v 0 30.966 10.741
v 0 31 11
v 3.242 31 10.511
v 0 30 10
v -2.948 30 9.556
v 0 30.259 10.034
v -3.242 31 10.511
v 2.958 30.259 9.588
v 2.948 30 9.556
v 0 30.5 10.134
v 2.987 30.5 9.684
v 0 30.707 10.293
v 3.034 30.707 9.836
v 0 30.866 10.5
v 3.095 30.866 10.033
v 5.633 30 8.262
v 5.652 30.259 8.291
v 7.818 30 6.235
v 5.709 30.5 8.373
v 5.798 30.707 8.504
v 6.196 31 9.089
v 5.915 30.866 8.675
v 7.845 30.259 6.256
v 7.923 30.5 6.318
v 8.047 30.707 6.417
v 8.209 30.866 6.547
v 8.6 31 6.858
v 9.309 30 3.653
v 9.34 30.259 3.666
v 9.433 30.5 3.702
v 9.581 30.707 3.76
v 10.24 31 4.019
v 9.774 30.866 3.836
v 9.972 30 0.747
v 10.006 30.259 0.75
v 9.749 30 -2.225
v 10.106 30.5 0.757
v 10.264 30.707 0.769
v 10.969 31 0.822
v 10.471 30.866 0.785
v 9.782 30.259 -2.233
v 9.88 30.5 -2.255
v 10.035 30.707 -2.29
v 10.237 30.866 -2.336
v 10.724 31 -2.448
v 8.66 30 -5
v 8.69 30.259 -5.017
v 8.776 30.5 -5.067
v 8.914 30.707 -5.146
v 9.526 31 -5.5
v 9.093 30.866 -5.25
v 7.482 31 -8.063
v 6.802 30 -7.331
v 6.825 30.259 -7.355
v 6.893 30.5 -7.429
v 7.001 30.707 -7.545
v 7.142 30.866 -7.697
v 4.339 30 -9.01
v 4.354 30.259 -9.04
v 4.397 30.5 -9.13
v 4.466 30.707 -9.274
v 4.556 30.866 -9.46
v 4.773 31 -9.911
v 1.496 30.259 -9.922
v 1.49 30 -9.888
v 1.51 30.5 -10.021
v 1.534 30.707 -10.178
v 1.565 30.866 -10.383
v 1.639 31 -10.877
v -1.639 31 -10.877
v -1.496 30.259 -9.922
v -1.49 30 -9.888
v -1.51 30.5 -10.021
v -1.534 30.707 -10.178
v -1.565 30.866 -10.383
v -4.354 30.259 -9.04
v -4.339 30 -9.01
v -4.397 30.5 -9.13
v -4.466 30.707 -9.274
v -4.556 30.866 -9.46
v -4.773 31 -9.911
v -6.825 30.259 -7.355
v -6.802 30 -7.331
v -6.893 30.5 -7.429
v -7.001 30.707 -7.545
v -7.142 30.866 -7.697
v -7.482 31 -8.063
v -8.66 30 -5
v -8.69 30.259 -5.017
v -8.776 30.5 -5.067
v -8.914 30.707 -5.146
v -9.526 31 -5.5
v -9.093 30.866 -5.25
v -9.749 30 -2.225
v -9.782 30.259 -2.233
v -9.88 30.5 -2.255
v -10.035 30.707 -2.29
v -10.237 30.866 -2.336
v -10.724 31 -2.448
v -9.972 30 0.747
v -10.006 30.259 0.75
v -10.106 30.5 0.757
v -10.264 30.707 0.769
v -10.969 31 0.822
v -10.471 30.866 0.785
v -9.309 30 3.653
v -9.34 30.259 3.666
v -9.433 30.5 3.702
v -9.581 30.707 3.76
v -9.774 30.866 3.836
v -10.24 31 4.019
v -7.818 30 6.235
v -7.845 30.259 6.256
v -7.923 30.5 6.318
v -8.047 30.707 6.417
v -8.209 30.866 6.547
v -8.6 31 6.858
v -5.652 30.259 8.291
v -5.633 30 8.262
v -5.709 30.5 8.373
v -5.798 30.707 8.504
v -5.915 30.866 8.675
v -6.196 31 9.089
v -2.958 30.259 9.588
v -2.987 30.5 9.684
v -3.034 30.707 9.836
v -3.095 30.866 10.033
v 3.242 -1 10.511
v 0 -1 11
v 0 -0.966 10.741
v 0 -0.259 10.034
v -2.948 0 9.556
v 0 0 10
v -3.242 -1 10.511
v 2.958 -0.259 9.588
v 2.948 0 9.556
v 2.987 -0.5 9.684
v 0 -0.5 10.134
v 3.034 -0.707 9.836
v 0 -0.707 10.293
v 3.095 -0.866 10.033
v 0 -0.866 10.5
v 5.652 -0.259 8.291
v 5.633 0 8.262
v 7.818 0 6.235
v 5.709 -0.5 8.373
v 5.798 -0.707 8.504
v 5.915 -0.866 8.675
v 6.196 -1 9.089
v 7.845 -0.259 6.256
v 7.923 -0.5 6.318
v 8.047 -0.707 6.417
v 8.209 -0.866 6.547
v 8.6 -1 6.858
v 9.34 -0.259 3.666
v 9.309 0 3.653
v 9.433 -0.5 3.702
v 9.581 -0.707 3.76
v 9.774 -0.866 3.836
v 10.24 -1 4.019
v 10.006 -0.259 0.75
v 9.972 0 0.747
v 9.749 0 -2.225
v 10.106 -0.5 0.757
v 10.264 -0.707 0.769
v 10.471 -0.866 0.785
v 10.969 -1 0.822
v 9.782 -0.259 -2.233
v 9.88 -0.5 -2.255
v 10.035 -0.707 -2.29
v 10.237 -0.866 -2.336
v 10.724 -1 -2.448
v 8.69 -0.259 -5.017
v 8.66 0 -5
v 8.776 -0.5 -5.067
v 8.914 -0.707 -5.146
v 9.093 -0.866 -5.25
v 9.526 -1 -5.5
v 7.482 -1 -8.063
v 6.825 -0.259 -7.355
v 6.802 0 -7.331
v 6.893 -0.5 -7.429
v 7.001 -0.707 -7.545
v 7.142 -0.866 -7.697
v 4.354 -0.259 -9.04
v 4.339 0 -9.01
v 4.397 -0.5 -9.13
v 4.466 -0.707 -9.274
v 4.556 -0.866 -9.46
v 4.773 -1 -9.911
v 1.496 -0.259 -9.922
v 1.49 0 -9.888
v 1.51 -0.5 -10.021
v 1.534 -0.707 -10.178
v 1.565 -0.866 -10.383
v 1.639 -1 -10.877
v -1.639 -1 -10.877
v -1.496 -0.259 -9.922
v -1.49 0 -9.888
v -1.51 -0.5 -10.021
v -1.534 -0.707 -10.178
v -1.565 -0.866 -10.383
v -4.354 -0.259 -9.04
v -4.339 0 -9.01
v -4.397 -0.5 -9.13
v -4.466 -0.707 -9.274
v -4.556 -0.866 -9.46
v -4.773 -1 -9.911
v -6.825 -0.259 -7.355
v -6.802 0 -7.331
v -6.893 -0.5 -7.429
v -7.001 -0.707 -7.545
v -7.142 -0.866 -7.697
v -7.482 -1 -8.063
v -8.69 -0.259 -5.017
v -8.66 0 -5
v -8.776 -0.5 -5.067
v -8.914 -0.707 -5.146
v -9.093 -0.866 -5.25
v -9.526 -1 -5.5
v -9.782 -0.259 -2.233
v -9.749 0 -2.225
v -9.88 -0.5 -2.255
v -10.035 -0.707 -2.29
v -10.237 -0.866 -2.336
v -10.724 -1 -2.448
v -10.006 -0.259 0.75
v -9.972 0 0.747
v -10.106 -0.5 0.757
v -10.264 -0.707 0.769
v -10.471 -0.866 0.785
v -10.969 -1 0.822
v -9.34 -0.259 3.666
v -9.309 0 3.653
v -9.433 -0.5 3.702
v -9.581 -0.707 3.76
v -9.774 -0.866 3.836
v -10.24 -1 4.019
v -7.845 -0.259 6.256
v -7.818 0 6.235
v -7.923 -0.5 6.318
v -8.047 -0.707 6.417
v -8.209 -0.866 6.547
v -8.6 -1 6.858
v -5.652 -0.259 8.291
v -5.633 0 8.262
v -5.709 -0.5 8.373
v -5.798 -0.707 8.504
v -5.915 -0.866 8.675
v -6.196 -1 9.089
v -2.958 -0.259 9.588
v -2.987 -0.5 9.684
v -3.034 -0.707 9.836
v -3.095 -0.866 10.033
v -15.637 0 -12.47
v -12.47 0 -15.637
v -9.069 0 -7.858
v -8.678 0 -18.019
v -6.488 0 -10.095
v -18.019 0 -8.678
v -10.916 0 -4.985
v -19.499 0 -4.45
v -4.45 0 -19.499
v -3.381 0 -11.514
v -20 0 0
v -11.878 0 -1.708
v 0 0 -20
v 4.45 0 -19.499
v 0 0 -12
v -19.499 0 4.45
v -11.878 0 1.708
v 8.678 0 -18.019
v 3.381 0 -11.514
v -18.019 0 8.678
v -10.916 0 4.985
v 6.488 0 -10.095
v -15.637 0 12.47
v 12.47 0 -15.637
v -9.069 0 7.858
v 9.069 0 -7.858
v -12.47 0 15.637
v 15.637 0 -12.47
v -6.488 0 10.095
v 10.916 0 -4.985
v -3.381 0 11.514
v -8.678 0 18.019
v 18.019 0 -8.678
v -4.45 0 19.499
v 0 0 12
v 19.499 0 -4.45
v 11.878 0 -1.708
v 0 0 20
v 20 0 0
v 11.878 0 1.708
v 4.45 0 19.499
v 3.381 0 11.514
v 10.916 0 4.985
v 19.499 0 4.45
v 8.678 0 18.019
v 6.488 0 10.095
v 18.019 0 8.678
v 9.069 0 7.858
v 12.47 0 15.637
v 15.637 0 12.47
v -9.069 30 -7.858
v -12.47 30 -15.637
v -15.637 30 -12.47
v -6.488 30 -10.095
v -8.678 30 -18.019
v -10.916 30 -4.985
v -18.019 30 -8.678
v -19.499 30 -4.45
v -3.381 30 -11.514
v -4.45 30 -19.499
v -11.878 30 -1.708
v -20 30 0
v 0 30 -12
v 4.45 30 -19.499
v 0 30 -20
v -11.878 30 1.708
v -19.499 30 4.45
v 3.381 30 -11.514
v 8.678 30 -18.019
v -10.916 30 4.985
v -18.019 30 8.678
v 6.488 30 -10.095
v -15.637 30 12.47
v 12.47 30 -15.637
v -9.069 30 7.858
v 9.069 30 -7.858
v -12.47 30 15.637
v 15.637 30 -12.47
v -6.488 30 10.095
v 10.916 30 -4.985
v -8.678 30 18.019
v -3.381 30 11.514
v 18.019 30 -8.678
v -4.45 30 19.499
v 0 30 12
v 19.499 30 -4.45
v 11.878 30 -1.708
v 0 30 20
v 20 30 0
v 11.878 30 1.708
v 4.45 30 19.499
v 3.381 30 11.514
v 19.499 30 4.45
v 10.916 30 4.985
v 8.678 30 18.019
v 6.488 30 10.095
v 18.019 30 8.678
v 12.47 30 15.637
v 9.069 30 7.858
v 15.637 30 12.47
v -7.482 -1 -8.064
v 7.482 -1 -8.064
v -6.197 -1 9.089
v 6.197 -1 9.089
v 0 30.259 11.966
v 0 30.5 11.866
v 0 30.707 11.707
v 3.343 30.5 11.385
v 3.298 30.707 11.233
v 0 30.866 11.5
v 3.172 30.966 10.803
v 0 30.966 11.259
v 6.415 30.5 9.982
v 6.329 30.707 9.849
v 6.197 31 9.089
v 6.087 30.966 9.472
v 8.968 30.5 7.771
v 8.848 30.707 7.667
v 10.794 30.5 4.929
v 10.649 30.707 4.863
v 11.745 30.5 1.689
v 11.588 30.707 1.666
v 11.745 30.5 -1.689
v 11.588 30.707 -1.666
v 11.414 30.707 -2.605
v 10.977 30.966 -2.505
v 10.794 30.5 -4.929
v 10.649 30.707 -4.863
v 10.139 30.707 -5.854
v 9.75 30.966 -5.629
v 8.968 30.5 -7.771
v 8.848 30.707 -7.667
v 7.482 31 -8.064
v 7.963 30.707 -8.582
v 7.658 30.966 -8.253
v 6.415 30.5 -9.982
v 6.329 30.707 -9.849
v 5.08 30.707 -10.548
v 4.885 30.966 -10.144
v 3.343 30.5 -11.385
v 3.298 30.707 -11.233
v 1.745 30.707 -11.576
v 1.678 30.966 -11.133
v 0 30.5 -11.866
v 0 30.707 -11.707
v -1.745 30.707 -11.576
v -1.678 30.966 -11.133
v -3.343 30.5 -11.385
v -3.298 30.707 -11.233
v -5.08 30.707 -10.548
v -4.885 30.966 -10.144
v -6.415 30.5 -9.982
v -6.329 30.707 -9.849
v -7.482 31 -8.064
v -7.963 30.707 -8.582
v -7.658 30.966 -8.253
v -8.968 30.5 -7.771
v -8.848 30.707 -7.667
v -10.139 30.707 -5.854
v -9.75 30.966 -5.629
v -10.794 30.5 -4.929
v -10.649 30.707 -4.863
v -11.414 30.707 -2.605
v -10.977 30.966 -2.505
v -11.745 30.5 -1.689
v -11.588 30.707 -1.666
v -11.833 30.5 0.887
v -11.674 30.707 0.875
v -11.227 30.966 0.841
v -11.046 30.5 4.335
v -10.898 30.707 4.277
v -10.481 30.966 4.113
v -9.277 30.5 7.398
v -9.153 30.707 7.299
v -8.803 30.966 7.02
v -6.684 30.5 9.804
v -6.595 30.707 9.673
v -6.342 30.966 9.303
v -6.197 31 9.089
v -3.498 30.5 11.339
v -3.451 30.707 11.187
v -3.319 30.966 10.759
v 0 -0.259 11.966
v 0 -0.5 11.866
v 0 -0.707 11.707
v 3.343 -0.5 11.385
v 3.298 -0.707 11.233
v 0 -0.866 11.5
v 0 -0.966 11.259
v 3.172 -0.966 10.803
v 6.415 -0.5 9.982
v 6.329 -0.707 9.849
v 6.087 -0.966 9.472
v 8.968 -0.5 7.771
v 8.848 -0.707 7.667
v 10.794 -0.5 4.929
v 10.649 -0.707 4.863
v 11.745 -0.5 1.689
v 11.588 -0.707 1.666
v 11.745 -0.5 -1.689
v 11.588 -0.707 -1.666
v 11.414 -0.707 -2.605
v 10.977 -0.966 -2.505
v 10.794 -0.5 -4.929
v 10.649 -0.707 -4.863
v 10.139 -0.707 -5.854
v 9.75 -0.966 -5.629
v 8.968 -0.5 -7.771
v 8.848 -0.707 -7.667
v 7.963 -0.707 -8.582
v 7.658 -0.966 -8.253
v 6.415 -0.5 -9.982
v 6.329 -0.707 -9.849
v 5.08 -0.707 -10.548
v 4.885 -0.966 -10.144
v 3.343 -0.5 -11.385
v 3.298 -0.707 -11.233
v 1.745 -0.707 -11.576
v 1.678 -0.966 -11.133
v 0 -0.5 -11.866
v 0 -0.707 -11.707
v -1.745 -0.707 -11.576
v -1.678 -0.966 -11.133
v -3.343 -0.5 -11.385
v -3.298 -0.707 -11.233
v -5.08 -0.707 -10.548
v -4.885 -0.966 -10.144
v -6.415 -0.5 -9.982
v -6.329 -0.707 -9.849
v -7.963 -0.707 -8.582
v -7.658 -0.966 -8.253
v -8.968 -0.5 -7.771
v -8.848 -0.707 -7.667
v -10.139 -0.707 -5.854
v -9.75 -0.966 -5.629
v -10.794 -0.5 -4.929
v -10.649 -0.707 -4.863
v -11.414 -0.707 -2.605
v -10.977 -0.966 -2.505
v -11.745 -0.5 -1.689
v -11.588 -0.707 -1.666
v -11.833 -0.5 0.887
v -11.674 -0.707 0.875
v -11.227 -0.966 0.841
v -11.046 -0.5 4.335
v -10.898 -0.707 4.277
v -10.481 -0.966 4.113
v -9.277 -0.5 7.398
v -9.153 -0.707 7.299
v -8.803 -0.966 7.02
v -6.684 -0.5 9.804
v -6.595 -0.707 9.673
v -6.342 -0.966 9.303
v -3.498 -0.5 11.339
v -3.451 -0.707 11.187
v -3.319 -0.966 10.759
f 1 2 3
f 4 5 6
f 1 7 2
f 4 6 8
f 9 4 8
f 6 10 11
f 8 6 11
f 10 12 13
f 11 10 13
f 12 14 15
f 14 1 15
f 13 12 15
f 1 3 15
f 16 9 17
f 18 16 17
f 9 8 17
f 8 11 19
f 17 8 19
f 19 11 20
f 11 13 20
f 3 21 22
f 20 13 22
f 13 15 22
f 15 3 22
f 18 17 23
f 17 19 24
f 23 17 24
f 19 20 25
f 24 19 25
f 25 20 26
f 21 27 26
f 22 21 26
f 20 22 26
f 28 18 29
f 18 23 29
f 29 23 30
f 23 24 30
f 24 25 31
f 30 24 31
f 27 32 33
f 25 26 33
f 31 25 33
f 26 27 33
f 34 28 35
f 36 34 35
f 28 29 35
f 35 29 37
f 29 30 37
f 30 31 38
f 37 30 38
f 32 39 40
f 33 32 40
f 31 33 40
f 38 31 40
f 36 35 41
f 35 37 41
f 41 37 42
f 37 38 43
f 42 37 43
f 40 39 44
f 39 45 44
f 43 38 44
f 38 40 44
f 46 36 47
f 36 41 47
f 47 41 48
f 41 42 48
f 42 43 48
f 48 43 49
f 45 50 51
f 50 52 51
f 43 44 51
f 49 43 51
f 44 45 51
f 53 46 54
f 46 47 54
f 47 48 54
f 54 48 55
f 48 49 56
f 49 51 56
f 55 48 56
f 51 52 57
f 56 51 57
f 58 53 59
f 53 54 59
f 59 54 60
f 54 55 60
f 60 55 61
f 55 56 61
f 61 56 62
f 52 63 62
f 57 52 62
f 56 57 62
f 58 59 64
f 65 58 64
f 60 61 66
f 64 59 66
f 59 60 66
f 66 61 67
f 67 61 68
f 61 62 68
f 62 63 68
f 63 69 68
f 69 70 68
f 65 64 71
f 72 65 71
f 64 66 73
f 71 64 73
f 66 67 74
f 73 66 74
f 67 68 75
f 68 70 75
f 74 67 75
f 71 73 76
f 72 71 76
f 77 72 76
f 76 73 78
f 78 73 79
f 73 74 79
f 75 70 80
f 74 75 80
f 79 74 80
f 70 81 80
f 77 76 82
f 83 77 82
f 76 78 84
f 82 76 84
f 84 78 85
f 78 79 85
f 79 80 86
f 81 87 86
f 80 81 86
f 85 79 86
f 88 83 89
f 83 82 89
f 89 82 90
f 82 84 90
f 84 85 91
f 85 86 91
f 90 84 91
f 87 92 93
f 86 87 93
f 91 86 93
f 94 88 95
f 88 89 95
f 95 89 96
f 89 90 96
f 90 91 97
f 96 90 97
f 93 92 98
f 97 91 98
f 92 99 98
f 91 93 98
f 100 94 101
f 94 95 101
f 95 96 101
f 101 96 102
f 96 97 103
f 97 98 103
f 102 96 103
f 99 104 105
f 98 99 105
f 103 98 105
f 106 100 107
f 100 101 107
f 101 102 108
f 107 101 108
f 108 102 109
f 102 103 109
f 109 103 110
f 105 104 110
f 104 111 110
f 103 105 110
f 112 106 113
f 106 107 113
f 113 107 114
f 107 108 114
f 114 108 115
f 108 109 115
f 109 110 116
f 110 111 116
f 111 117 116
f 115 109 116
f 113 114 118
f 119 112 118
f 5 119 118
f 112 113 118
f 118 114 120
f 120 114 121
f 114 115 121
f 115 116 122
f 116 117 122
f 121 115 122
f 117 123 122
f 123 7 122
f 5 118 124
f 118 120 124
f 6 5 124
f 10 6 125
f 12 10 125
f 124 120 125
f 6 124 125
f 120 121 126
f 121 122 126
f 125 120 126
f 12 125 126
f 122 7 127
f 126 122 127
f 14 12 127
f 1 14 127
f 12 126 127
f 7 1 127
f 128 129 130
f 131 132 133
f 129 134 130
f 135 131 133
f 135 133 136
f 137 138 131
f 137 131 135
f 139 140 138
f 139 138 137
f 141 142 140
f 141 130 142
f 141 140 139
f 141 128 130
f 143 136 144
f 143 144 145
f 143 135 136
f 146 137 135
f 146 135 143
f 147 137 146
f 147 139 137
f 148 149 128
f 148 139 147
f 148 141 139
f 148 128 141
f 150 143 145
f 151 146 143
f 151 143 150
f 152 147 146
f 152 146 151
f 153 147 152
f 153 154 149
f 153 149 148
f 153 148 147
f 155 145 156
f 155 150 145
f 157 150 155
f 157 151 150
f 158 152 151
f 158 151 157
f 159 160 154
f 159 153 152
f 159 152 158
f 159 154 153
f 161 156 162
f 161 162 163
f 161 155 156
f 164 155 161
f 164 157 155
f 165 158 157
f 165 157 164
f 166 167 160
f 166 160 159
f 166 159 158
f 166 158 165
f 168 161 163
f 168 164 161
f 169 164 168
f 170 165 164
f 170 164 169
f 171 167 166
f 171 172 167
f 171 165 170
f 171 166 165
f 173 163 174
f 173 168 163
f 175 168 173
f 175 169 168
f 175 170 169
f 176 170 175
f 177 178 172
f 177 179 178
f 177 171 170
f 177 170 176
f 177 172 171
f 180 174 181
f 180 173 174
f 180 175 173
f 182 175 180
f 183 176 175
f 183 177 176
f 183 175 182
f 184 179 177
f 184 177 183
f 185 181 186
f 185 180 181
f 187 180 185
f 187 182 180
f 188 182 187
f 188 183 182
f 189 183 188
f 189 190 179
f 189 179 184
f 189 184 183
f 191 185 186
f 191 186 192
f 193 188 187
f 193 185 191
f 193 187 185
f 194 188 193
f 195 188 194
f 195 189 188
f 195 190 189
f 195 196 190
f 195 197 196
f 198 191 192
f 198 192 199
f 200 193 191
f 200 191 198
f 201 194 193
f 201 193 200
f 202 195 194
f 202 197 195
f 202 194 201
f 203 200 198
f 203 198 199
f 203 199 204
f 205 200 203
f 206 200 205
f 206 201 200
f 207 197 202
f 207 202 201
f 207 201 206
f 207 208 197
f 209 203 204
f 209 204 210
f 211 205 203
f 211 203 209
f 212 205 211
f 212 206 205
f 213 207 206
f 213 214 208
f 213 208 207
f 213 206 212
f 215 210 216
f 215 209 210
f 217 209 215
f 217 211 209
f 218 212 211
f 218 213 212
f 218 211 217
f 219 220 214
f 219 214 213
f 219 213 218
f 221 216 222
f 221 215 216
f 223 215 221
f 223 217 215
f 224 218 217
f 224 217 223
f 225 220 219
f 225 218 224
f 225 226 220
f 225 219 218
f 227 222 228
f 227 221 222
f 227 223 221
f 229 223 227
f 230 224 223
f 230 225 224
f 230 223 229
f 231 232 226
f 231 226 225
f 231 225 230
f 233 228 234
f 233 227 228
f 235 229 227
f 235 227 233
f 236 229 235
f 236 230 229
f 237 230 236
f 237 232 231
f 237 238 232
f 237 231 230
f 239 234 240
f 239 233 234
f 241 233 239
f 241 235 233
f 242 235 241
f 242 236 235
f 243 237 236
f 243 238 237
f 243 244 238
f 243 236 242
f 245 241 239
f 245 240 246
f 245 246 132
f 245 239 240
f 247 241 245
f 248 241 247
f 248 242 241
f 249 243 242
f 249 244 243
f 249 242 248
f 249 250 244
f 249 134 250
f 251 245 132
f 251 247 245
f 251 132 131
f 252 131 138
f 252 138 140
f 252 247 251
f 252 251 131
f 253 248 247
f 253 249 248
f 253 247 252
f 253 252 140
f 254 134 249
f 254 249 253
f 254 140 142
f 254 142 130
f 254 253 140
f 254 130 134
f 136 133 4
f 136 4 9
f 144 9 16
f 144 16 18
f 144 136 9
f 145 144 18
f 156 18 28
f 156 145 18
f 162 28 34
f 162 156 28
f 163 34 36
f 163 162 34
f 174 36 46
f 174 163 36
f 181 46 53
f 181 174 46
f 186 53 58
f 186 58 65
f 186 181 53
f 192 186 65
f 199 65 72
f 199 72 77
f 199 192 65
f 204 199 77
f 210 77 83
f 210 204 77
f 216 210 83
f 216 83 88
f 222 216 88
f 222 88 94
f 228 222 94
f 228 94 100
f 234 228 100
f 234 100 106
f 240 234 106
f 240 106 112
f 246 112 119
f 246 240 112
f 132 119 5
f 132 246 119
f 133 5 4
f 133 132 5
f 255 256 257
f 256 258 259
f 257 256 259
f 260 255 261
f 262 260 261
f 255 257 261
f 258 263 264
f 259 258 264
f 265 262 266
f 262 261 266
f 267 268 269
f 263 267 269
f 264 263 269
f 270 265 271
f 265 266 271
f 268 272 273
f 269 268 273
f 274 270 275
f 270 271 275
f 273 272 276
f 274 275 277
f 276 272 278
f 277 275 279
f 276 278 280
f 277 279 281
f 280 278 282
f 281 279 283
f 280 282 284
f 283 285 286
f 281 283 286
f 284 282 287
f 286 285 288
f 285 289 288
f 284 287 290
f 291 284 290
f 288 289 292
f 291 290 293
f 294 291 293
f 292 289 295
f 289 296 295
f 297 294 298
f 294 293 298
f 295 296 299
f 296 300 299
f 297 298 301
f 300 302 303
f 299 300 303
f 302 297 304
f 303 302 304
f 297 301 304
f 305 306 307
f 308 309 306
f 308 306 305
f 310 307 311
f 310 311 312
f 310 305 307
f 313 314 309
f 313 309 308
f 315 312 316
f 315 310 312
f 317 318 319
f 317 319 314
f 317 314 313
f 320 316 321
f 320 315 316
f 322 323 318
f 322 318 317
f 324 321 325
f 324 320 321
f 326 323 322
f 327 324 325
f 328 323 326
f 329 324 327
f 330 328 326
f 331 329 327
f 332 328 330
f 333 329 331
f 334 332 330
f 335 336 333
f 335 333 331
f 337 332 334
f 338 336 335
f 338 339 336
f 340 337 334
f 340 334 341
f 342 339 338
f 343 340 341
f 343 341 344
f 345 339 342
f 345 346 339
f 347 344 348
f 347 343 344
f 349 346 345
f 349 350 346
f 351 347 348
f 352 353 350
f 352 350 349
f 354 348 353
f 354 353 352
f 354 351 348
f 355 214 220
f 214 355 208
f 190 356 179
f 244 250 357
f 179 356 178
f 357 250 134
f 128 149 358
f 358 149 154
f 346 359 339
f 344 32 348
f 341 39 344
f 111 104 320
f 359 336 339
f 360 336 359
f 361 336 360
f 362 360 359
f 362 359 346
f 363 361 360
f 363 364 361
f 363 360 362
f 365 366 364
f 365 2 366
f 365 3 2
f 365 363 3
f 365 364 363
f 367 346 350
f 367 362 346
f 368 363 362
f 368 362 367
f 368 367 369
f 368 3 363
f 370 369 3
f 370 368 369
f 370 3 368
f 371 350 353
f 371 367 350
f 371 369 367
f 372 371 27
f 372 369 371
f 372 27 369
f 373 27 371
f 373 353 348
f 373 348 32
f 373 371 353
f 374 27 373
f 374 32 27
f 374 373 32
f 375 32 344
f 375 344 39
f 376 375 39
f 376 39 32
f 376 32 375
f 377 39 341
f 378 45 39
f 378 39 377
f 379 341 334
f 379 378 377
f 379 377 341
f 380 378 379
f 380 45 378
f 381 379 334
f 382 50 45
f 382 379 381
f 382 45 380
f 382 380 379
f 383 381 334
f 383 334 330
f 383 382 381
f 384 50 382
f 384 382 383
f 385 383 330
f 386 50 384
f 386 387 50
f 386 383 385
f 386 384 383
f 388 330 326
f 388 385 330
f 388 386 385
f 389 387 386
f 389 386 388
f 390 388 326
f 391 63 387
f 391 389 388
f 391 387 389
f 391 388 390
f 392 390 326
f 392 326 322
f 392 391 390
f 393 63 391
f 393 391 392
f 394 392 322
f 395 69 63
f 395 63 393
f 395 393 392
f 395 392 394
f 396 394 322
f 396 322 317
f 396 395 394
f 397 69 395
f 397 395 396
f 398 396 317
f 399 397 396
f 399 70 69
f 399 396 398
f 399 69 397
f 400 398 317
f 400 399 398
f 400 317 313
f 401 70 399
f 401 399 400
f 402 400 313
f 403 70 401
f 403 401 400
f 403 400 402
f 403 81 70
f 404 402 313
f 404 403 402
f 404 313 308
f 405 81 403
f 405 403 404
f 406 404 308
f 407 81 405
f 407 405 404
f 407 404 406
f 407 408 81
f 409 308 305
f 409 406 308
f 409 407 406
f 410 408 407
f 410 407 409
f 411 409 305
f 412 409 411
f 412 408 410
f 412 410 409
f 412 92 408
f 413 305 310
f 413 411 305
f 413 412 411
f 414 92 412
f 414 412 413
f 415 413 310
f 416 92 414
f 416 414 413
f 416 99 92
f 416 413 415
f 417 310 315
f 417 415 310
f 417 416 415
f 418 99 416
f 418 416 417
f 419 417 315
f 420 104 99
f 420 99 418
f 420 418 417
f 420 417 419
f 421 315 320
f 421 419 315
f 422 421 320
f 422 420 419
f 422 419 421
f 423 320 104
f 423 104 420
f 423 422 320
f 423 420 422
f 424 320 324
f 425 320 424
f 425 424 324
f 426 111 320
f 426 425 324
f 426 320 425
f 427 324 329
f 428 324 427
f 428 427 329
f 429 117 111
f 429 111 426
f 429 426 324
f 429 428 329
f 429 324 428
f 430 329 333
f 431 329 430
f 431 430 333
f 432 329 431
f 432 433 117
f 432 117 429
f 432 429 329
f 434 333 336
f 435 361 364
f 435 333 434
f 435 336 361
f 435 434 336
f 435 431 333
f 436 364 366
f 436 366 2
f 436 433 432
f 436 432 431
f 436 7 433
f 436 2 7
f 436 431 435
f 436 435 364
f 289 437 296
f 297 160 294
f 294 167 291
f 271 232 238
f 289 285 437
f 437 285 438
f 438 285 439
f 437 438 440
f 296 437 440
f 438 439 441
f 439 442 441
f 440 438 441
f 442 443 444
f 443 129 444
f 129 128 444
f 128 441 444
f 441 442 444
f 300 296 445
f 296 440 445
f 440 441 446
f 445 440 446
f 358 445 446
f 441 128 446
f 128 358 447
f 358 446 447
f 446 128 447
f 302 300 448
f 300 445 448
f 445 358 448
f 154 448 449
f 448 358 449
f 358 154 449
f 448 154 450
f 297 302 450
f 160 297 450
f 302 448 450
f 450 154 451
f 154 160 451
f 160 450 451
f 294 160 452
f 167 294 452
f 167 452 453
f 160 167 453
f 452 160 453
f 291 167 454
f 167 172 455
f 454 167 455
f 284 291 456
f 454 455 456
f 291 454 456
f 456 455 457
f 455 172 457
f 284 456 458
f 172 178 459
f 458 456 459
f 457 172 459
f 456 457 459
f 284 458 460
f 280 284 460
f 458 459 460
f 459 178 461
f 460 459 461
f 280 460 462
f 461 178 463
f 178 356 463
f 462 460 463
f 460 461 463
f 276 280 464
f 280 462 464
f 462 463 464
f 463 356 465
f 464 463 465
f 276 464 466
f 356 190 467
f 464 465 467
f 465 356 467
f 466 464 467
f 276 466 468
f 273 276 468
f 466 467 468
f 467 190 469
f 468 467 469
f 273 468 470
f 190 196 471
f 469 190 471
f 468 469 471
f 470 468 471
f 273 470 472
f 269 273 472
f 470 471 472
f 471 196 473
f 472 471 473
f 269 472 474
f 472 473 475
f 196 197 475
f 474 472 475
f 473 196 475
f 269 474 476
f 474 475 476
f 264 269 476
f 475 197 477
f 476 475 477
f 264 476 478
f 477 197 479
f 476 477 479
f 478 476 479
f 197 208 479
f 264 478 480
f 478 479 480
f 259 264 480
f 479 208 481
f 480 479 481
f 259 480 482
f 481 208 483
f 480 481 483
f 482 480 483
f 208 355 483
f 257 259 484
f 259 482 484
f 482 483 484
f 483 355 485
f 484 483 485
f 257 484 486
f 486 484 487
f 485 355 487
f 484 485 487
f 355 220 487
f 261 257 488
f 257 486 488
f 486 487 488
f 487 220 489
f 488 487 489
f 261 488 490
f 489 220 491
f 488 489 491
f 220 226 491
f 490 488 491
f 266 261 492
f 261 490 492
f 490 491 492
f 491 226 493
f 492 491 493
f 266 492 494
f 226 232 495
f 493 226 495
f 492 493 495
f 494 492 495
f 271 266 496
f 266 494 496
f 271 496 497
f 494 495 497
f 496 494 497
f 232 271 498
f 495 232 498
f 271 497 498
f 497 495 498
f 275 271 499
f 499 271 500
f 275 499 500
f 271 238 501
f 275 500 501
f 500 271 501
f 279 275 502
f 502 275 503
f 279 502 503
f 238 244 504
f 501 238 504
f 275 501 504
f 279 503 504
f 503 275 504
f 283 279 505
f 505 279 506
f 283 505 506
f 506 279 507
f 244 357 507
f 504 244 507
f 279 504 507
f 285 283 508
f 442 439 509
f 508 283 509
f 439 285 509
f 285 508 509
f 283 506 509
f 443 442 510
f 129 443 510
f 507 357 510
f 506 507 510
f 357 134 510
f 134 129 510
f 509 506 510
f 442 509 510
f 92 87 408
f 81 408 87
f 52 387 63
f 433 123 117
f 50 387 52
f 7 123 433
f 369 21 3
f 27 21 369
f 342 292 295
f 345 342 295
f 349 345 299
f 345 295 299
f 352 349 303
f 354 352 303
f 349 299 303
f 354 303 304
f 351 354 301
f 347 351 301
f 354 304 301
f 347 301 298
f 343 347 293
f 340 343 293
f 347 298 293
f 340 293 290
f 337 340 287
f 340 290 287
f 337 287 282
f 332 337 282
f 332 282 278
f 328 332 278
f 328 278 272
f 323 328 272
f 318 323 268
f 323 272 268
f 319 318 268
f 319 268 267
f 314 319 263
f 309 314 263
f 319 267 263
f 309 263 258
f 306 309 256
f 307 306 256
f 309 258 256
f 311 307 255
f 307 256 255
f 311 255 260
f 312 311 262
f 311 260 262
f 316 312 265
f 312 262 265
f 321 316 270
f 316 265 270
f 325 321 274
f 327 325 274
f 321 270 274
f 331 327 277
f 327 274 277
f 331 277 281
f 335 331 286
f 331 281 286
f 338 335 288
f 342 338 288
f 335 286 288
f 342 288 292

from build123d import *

# Parameters (mm, degrees)
PROFILE_SKETCH_R              = 20
PROFILE_SKETCH_R_2            = 10
PROFILE_EXTRUDE_DEPTH         = 30
RING_LIP_PROFILE_R            = 12
RING_LIP_PROFILE_R_2          = 10
TOP_RING_LIP_EXTRUDE_DEPTH    = 1
BOTTOM_START                  = -31
SKETCH2_2_R                   = 12
SKETCH2_2_R_2                 = 10
BOTTOM_RING_LIP_EXTRUDE_DEPTH = 1
TOP_RING_LIP_FILLET_R         = 1
BOTTOM_RING_LIP_FILLET_R      = 1


with BuildPart() as part:
    # Profile Sketch → Profile Extrude (new body)
    with BuildSketch(Plane(origin=(0, 0, 0), x_dir=(1, 0, 0), z_dir=(0, 1, 0))):
        with Locations(Location((0, 0, 0), (0, 0, 270))):
            Circle(PROFILE_SKETCH_R)
        with Locations(Location((0, 0, 0), (0, 0, 270))):
            Circle(PROFILE_SKETCH_R_2, mode=Mode.SUBTRACT)
    extrude(amount=PROFILE_EXTRUDE_DEPTH)

    # Ring Lip Profile → Top Ring Lip Extrude (add)
    with BuildSketch(Plane(origin=(0, 30, 0), x_dir=(1, 0, 0), z_dir=(0, 1, 0))):
        with Locations(Location((0, 0, 0), (0, 0, 270))):
            Circle(RING_LIP_PROFILE_R)
        with Locations(Location((0, 0, 0), (0, 0, 270))):
            Circle(RING_LIP_PROFILE_R_2, mode=Mode.SUBTRACT)
    extrude(amount=TOP_RING_LIP_EXTRUDE_DEPTH)

    # Sketch2<2> → Bottom Ring Lip Extrude (add)
    with BuildSketch(Plane(origin=(0, 30, 0), x_dir=(1, 0, 0), z_dir=(0, 1, 0)).offset(BOTTOM_START)):
        with Locations(Location((0, 0, 0), (0, 0, 270))):
            Circle(SKETCH2_2_R)
        with Locations(Location((0, 0, 0), (0, 0, 270))):
            Circle(SKETCH2_2_R_2, mode=Mode.SUBTRACT)
    extrude(amount=BOTTOM_RING_LIP_EXTRUDE_DEPTH)

    # Top Ring Lip Fillet
    top_ring_lip_fillet_edges = [part.edges().sort_by_distance(p)[0] for p in [
        (0, -1, -12),
        (0, -1, -10),
    ]]
    fillet(top_ring_lip_fillet_edges, radius=TOP_RING_LIP_FILLET_R - 0.0001)  # a hair under: the kernel refuses the full size

    # Bottom Ring Lip Fillet
    bottom_ring_lip_fillet_edges = [part.edges().sort_by_distance(p)[0] for p in [
        (0, 31, -12),
        (0, 31, -10),
    ]]
    fillet(bottom_ring_lip_fillet_edges, radius=BOTTOM_RING_LIP_FILLET_R - 0.0001)  # a hair under: the kernel refuses the full size


solid = part.part
